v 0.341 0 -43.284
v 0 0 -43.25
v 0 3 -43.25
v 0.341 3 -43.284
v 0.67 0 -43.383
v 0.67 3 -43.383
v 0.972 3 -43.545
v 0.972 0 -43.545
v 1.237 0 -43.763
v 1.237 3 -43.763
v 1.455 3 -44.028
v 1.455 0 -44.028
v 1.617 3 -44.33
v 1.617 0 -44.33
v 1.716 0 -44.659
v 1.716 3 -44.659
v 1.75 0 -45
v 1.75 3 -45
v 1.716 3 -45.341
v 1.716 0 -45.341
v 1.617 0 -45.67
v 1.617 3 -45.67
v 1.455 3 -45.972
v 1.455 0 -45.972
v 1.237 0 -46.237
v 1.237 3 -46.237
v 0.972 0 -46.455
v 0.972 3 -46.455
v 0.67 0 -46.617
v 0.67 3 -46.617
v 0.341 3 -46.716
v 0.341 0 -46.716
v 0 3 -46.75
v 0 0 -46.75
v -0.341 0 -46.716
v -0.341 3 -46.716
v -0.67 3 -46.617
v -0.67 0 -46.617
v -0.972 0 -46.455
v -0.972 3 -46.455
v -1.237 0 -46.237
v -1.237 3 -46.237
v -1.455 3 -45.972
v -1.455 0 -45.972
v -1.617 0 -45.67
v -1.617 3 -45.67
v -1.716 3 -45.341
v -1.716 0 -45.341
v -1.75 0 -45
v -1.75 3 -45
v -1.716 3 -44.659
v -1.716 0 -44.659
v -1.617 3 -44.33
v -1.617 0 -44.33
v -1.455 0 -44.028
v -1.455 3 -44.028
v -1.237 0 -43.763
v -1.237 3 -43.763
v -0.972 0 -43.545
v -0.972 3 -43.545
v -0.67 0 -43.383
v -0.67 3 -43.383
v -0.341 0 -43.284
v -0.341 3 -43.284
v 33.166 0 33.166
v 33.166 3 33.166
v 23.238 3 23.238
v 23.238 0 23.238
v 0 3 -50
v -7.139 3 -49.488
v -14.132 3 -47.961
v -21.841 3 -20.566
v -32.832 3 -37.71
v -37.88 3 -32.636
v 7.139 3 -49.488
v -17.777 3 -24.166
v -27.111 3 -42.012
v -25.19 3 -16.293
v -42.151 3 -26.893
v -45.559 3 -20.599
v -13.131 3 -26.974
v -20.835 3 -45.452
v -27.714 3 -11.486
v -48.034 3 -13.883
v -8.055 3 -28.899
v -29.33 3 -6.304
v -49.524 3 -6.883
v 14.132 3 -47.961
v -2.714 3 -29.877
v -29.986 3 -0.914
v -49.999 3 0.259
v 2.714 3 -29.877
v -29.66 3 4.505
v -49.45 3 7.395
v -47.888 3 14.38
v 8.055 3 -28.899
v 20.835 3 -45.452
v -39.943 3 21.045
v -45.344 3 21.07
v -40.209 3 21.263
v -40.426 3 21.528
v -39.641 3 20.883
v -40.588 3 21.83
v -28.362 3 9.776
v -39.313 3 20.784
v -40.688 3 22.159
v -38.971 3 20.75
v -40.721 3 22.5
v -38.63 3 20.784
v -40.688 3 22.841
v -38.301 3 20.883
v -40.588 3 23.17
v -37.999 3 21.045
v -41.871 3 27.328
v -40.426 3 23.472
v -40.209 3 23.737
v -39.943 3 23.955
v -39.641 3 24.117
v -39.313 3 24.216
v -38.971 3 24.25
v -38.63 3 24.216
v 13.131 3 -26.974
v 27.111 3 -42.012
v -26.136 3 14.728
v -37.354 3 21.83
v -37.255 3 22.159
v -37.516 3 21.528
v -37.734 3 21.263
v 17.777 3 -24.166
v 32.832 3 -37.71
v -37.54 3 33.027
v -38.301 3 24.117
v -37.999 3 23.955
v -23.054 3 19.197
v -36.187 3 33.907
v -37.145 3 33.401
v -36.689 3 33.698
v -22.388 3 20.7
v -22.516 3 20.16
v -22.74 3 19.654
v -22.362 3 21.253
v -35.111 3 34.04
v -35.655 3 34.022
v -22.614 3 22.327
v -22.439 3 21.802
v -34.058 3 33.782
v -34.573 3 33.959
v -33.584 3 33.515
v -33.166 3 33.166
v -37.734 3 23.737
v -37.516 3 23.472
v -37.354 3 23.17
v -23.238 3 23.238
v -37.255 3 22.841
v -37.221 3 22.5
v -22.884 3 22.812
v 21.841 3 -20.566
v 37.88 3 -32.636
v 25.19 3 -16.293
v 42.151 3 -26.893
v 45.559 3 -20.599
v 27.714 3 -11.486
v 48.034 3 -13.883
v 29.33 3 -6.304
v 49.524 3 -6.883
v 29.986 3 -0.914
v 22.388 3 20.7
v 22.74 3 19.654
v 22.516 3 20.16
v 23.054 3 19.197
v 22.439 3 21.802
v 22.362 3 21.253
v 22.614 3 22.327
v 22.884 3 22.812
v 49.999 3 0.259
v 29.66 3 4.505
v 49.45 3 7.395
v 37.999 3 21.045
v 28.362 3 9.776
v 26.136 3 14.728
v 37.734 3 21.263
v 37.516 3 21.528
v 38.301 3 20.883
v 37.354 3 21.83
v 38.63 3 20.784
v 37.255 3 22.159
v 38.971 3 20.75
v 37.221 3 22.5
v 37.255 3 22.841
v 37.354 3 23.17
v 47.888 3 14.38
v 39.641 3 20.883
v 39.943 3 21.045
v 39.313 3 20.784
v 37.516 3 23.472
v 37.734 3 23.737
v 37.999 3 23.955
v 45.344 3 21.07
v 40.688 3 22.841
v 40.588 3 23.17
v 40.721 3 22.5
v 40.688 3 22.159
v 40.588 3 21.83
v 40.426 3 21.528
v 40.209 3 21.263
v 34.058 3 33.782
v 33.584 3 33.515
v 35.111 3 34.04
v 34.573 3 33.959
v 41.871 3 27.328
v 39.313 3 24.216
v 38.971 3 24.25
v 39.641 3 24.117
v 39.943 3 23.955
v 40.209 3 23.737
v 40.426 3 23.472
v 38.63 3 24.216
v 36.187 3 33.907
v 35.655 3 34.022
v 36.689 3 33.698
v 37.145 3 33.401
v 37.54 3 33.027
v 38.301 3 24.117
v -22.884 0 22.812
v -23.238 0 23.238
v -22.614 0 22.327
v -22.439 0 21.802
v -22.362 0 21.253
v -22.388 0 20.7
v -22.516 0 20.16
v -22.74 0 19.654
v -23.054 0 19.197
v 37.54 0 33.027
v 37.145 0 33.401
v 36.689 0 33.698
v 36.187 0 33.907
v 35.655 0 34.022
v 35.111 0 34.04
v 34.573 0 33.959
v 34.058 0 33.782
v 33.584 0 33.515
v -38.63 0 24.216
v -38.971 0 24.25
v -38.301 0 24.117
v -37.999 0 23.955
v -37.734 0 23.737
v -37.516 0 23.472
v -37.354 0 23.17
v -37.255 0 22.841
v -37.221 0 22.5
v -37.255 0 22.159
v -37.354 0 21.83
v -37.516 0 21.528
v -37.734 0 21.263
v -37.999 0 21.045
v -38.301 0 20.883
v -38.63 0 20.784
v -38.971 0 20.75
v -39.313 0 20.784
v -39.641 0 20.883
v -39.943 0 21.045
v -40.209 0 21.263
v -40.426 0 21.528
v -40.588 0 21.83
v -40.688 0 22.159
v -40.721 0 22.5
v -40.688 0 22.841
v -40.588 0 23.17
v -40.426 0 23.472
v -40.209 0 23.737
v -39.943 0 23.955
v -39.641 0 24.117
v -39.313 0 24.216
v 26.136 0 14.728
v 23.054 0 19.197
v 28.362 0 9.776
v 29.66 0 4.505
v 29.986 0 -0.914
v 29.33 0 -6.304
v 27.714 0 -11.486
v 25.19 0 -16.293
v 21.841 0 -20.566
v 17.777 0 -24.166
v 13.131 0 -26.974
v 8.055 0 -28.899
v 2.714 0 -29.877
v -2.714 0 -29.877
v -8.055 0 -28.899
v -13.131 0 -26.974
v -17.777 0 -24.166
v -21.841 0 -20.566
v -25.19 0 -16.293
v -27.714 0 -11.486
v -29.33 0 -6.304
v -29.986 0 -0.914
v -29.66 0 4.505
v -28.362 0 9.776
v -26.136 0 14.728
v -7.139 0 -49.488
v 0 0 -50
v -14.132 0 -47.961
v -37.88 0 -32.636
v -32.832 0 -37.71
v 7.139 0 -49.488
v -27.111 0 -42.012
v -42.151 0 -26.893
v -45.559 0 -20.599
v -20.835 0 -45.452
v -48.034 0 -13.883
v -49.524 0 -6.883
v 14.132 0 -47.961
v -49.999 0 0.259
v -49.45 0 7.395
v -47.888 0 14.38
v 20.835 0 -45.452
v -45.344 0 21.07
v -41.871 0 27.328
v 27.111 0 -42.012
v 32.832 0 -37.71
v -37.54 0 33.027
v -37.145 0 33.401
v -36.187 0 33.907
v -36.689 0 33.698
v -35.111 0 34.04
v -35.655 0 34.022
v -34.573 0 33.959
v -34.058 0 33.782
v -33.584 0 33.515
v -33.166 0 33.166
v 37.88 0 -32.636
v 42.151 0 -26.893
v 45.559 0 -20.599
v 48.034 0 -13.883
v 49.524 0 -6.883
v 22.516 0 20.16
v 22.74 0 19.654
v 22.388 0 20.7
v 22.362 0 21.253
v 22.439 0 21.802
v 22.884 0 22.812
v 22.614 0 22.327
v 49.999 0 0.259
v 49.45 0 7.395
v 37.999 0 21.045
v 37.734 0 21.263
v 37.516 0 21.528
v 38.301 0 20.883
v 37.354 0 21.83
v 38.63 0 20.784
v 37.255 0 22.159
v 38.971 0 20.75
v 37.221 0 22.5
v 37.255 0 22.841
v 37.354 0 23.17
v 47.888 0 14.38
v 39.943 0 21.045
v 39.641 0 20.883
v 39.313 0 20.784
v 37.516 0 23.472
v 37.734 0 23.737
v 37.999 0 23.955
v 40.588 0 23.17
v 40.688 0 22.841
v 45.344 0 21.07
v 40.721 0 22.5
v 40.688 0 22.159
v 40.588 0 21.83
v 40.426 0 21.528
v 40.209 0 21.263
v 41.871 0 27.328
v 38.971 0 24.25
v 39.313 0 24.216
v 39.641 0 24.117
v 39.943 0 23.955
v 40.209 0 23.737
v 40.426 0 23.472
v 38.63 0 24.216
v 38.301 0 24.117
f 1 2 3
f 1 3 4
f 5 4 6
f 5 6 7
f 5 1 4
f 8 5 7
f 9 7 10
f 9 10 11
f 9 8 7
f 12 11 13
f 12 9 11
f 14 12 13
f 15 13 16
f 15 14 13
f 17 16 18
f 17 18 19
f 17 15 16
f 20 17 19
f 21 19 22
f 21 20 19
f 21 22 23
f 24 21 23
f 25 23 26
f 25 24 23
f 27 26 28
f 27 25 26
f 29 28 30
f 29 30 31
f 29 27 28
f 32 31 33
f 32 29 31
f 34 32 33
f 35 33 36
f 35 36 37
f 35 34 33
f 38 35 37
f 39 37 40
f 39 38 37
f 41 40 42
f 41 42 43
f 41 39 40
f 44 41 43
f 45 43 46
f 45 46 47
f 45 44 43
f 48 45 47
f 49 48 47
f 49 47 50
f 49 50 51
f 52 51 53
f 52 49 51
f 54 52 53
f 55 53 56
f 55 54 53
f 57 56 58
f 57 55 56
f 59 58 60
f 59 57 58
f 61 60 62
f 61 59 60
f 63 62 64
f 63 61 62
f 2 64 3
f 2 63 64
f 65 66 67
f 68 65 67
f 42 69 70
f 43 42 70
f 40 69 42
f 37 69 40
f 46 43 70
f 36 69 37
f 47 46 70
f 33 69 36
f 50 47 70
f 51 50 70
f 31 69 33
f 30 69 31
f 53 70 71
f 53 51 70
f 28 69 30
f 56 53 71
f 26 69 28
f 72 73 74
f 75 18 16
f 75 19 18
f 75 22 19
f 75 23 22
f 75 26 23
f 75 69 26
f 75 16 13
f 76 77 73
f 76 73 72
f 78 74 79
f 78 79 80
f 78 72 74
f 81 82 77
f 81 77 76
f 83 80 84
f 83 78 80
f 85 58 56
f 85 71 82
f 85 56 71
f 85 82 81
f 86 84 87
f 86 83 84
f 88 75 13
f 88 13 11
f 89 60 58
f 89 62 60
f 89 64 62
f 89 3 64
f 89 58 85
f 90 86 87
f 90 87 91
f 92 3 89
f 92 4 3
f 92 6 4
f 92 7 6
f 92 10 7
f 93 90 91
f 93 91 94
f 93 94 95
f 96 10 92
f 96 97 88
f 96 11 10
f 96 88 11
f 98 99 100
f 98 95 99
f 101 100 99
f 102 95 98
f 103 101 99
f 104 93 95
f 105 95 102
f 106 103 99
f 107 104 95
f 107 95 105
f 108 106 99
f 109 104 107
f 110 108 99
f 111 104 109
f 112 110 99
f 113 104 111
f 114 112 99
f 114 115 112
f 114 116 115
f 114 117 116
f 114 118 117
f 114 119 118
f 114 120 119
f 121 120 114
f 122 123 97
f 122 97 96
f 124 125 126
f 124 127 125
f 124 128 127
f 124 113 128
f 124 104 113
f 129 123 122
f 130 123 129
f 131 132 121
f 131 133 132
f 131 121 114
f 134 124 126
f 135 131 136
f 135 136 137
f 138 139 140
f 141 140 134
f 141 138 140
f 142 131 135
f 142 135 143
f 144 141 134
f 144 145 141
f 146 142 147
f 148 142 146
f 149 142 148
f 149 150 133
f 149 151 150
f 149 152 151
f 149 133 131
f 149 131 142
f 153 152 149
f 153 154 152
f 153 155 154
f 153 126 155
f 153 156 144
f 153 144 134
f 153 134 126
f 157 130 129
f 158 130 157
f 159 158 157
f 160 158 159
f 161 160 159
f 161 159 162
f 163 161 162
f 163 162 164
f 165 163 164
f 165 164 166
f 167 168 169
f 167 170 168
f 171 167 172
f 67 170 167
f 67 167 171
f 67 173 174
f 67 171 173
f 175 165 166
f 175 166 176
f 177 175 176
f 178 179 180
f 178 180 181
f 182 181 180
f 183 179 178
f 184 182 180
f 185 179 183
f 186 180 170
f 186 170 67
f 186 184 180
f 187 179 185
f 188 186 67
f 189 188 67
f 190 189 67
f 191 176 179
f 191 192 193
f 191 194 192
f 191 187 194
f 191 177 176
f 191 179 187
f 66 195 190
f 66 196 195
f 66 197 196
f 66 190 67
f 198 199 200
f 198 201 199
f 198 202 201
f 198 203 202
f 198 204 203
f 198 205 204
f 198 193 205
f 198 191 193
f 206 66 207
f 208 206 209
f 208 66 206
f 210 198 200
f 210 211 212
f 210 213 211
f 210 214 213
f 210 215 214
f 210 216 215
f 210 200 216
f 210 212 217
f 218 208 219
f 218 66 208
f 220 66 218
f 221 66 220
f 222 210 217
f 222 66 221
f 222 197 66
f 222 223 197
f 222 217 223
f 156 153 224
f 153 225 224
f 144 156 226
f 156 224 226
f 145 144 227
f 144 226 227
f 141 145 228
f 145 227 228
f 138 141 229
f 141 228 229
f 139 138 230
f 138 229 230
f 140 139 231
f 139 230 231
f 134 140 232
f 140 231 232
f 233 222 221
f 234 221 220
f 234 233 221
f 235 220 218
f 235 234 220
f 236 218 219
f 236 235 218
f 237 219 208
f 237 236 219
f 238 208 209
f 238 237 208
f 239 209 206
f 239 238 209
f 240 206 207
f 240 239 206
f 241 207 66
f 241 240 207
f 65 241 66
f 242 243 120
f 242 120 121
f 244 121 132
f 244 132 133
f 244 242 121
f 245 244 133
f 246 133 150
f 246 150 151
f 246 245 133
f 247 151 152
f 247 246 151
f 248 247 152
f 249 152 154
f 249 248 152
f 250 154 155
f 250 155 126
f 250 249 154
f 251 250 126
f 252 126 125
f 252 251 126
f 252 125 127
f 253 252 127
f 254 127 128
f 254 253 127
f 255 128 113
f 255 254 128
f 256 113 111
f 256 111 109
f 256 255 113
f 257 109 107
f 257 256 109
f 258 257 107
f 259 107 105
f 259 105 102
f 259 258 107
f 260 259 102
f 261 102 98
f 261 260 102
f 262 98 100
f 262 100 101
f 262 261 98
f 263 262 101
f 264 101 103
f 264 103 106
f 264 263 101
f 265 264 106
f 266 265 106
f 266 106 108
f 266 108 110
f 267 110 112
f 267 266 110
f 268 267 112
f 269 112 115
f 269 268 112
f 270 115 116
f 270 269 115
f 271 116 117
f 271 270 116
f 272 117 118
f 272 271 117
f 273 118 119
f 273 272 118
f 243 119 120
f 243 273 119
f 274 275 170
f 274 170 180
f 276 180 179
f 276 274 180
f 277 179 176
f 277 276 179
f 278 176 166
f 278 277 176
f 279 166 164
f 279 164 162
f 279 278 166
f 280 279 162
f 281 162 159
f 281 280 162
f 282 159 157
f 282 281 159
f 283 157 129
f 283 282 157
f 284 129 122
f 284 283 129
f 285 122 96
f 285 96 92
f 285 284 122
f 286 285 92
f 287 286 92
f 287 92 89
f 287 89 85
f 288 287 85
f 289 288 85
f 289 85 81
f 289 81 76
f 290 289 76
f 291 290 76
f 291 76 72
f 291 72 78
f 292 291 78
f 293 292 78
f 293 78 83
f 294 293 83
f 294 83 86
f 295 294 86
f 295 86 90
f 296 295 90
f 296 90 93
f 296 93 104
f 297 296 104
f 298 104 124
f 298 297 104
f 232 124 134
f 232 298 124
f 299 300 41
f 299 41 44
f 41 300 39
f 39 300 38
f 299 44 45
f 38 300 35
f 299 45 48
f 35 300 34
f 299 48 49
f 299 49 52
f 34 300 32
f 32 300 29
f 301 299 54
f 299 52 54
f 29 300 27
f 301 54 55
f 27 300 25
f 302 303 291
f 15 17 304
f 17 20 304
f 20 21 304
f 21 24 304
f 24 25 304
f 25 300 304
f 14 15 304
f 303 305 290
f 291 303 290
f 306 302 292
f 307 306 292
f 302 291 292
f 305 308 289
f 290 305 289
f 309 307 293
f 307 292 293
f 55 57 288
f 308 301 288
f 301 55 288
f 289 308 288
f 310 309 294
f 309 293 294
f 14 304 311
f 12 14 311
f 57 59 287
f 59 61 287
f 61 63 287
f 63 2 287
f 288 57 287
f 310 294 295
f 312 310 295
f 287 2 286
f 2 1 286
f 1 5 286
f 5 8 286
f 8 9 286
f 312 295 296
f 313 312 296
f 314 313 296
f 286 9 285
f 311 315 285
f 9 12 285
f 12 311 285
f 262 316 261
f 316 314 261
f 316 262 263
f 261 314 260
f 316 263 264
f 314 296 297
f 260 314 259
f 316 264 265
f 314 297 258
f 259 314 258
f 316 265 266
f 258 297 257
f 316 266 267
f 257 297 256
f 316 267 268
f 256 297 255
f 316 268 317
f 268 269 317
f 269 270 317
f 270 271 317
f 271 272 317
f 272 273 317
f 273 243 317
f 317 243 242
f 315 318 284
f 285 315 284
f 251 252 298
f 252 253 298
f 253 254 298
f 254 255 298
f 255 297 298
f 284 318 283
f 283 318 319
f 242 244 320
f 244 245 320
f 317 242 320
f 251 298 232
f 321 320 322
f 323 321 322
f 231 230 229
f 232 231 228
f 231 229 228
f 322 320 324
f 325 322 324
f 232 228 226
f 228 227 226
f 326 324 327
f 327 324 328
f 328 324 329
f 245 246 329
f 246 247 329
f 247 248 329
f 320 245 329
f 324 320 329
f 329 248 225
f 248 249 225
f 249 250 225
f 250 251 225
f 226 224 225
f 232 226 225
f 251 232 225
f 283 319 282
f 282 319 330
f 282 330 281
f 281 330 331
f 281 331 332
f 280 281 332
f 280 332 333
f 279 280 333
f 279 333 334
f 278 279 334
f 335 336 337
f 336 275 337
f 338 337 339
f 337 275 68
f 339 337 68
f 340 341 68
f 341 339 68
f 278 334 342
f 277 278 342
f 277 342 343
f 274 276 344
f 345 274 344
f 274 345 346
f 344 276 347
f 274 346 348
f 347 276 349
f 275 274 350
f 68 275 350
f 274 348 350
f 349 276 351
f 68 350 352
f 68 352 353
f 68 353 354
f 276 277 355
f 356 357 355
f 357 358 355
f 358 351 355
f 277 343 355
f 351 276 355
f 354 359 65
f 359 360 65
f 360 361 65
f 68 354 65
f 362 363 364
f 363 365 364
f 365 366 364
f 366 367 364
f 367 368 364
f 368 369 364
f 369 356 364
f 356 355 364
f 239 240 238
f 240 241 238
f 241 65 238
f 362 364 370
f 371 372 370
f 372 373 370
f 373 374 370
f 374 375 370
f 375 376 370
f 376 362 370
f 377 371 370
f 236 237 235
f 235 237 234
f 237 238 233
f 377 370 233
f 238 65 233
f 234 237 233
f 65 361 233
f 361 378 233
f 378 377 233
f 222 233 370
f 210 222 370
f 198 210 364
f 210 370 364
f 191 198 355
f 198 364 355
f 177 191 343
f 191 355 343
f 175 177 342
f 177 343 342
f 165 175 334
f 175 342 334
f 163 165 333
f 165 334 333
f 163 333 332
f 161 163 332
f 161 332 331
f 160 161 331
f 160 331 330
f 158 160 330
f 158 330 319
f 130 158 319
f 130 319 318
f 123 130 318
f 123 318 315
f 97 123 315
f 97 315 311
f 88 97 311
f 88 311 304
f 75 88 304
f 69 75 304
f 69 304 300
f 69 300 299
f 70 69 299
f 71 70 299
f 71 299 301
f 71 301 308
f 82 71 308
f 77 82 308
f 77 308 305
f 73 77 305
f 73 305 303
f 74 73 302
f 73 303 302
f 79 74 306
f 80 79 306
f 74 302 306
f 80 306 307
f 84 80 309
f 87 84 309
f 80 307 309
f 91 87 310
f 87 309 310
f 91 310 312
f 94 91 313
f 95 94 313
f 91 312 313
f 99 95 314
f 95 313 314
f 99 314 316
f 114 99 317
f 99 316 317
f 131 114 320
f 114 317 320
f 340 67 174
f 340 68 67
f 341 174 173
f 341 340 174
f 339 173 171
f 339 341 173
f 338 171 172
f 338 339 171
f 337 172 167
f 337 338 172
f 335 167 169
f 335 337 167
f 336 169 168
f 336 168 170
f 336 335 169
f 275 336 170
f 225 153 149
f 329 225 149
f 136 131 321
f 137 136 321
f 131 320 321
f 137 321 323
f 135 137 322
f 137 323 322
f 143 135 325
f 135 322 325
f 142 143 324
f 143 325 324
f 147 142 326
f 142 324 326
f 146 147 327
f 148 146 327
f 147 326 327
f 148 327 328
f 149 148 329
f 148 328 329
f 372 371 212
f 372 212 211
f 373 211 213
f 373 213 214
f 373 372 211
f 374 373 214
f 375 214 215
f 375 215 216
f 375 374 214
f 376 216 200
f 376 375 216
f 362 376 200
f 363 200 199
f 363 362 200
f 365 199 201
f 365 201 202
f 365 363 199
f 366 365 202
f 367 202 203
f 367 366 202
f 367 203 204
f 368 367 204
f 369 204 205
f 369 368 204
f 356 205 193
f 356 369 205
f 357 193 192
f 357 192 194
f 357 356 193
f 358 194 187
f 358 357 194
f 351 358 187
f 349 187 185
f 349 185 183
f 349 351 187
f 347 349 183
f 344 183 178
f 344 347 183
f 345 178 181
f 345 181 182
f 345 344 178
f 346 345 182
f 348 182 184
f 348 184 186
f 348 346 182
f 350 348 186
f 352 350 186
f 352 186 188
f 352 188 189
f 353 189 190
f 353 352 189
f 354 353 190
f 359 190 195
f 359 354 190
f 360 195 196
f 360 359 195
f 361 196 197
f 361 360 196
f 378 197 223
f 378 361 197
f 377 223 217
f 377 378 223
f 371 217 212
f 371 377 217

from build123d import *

# Parameters (mm, degrees)
SKETCH1_R           = 50
SKETCH1_R_2         = 30
SKETCH1_R_3         = 1.75
BOSS_EXTRUDE1_DEPTH = 3
CUT_EXTRUDE1_DEPTH  = 14
FILLET1_R           = 3


with BuildPart() as part:
    # Sketch1 → Boss-Extrude1 (new body)
    with BuildSketch(Plane(origin=(0, 0, 0), x_dir=(1, 0, 0), z_dir=(0, 1, 0))):
        with Locations(Location((0, 0, 0), (0, 0, 270))):
            Circle(SKETCH1_R)
        with Locations(Location((0, 0, 0), (0, 0, 270))):
            Circle(SKETCH1_R_2, mode=Mode.SUBTRACT)
        with Locations(Location((0, 45, 0), (0, 0, 270))):
            Circle(SKETCH1_R_3, mode=Mode.SUBTRACT)
        with Locations(Location((38.97114317, -22.5, 0), (0, 0, 270))):
            Circle(SKETCH1_R_3, mode=Mode.SUBTRACT)
        with Locations(Location((-38.97114317, -22.5, 0), (0, 0, 270))):
            Circle(SKETCH1_R_3, mode=Mode.SUBTRACT)
    extrude(amount=BOSS_EXTRUDE1_DEPTH)

    # Sketch2 → Cut-Extrude1 (cut)
    with BuildSketch(Plane(origin=(0, 3, 0), x_dir=(1, 0, 0), z_dir=(0, 1, 0))):
        Polygon((0, 0), (-50, -50), (50, -50), align=None)
    extrude(amount=-CUT_EXTRUDE1_DEPTH, mode=Mode.SUBTRACT)

    # Fillet1
    fillet1_edges = [part.edges().sort_by_distance(p)[0] for p in [
        (-21.213203436, 1.5, 21.213203436),
        (21.213203436, 1.5, 21.213203436),
        (35.355339059, 1.5, 35.355339059),
        (-35.355339059, 1.5, 35.355339059),
    ]]
    fillet(fillet1_edges, radius=FILLET1_R)


solid = part.part
